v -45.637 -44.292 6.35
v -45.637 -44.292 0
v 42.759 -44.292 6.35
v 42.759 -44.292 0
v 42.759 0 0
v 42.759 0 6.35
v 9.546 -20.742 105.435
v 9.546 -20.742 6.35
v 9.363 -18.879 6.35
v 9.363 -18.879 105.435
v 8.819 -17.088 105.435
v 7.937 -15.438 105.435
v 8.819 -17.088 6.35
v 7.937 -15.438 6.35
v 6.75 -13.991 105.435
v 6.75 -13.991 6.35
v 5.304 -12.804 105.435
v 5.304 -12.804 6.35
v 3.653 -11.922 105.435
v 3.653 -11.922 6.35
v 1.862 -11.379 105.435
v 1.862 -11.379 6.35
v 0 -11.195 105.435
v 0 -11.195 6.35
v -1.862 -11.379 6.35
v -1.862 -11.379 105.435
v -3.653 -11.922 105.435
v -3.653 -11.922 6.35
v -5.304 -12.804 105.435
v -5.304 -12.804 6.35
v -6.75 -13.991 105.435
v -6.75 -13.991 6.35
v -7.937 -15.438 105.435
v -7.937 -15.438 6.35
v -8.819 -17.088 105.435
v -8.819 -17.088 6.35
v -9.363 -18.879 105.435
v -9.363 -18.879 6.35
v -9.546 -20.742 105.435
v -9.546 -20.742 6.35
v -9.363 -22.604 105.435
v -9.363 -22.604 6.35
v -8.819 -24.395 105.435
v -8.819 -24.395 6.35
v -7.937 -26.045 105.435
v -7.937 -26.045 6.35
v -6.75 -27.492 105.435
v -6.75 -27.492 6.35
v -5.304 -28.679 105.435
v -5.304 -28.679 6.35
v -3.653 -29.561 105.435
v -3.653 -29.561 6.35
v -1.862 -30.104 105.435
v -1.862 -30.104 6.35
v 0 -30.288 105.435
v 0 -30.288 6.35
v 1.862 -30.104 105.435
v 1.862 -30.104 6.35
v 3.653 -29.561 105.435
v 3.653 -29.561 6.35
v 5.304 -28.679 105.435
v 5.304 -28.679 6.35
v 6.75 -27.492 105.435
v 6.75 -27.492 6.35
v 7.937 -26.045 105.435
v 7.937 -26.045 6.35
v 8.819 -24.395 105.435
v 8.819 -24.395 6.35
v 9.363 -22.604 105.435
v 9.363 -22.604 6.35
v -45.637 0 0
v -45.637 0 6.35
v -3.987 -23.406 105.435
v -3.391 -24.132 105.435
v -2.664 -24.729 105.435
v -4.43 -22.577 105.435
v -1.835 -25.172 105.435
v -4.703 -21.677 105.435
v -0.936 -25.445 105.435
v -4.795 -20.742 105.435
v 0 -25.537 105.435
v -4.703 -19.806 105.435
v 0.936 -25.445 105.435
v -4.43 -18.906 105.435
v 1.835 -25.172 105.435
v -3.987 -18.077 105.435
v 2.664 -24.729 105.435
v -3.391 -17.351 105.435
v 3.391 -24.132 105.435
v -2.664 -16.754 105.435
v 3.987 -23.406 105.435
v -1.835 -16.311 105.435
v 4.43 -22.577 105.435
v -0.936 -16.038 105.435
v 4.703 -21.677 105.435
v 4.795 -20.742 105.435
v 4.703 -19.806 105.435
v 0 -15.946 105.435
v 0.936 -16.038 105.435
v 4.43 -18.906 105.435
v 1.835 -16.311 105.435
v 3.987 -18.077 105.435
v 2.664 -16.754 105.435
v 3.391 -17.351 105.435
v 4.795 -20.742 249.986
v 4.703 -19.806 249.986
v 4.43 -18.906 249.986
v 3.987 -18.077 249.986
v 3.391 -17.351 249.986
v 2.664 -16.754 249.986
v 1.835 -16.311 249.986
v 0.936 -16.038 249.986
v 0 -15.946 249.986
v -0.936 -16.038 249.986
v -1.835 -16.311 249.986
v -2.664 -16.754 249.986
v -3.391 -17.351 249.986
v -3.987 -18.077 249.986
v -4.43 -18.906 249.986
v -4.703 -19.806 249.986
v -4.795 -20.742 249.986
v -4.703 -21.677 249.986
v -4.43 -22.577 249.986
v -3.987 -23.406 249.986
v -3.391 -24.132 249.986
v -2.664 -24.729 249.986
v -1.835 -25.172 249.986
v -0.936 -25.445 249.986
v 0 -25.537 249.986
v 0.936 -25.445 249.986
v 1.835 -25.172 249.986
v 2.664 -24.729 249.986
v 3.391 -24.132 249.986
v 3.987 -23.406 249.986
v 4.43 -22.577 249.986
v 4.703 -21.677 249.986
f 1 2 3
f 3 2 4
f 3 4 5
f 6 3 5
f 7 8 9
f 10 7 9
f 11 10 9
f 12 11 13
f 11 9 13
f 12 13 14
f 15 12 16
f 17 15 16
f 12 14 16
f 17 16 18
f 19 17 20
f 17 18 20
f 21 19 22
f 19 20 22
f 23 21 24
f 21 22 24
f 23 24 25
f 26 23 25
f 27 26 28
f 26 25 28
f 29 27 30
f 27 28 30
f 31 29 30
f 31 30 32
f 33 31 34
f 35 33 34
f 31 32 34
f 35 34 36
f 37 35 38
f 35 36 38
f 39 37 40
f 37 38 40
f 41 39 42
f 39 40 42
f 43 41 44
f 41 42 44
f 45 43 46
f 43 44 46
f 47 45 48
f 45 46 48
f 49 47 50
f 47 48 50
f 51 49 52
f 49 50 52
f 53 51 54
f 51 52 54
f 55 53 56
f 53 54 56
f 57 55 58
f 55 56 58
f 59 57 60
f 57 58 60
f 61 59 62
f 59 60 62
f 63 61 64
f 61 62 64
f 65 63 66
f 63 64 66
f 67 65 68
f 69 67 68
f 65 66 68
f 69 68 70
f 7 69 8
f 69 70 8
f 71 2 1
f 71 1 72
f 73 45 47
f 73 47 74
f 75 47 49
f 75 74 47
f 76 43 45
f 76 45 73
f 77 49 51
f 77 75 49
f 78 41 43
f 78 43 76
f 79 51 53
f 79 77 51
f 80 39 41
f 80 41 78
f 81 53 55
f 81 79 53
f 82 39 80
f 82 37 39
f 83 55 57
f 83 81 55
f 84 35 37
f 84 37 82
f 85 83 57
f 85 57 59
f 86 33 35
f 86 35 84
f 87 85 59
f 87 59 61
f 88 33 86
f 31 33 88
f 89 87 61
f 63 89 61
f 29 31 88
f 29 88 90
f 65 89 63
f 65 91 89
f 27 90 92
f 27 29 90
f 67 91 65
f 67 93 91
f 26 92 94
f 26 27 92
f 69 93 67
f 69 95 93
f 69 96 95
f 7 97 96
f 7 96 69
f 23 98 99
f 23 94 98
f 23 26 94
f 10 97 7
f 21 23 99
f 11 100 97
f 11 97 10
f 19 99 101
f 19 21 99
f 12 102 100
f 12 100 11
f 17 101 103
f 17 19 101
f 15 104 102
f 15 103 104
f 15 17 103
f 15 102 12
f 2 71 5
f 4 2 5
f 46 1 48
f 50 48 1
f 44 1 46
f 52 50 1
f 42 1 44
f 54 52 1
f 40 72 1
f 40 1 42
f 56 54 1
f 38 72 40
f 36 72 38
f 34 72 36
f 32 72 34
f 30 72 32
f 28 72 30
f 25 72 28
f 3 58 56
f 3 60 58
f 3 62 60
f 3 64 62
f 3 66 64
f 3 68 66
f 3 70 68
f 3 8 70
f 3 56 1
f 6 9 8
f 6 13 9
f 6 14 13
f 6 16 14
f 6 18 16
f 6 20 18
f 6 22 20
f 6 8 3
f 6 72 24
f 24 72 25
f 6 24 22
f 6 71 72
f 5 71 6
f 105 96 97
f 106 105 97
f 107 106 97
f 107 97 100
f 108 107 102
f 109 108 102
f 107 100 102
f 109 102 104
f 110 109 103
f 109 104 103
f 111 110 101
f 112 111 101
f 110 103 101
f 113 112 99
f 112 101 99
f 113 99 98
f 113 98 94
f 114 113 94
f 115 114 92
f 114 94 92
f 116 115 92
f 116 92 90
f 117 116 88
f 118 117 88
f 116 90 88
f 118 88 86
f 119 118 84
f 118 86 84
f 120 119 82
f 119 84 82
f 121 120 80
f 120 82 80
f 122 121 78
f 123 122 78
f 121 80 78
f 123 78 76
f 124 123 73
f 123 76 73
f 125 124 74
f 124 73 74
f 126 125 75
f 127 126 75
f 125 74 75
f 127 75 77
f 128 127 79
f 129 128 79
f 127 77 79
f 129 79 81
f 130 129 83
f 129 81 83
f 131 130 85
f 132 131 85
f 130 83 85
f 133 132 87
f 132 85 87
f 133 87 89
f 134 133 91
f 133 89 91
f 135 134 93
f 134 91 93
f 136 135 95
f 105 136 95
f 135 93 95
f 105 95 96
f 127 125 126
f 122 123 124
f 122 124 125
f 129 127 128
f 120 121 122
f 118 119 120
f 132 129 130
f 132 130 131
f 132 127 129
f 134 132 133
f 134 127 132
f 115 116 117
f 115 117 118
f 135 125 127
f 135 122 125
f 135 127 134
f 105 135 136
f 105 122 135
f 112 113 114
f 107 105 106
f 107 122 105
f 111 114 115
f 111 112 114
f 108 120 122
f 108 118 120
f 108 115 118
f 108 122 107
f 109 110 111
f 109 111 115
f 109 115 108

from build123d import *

# Parameters (mm, degrees)
F0_W     = 88.395819068
F0_H     = 44.2917048931
F1_DEPTH = 6.35
F2_R     = 9.5460938565
F3_DEPTH = 99.0852161
F4_R     = 4.7953323776
F5_DEPTH = 144.5512078


# Not quite as in the source:
# - an extrude ends at something that could not be found from the text; its depth is read off the source's solid


with BuildPart() as f1:
    # F0 (on Top) → F1 (new body)
    with BuildSketch(Plane.XY):
        with Locations((-1.4388076961, -22.1458524466)):
            Rectangle(F0_W, F0_H)
    extrude(amount=F1_DEPTH)

    # F2 (on face) → F3 (join, through all)
    with BuildSketch(Plane.XY.offset(6.35)):
        with Locations((0, -20.7415707409)):
            Circle(F2_R)
    extrude(amount=F3_DEPTH)

    # F4 (on face) → F5 (join, through all)
    with BuildSketch(Plane.XY.offset(105.4352161291)):
        with Locations((0, -20.7415707409)):
            Circle(F4_R)
    extrude(amount=F5_DEPTH)


solid = f1.part
